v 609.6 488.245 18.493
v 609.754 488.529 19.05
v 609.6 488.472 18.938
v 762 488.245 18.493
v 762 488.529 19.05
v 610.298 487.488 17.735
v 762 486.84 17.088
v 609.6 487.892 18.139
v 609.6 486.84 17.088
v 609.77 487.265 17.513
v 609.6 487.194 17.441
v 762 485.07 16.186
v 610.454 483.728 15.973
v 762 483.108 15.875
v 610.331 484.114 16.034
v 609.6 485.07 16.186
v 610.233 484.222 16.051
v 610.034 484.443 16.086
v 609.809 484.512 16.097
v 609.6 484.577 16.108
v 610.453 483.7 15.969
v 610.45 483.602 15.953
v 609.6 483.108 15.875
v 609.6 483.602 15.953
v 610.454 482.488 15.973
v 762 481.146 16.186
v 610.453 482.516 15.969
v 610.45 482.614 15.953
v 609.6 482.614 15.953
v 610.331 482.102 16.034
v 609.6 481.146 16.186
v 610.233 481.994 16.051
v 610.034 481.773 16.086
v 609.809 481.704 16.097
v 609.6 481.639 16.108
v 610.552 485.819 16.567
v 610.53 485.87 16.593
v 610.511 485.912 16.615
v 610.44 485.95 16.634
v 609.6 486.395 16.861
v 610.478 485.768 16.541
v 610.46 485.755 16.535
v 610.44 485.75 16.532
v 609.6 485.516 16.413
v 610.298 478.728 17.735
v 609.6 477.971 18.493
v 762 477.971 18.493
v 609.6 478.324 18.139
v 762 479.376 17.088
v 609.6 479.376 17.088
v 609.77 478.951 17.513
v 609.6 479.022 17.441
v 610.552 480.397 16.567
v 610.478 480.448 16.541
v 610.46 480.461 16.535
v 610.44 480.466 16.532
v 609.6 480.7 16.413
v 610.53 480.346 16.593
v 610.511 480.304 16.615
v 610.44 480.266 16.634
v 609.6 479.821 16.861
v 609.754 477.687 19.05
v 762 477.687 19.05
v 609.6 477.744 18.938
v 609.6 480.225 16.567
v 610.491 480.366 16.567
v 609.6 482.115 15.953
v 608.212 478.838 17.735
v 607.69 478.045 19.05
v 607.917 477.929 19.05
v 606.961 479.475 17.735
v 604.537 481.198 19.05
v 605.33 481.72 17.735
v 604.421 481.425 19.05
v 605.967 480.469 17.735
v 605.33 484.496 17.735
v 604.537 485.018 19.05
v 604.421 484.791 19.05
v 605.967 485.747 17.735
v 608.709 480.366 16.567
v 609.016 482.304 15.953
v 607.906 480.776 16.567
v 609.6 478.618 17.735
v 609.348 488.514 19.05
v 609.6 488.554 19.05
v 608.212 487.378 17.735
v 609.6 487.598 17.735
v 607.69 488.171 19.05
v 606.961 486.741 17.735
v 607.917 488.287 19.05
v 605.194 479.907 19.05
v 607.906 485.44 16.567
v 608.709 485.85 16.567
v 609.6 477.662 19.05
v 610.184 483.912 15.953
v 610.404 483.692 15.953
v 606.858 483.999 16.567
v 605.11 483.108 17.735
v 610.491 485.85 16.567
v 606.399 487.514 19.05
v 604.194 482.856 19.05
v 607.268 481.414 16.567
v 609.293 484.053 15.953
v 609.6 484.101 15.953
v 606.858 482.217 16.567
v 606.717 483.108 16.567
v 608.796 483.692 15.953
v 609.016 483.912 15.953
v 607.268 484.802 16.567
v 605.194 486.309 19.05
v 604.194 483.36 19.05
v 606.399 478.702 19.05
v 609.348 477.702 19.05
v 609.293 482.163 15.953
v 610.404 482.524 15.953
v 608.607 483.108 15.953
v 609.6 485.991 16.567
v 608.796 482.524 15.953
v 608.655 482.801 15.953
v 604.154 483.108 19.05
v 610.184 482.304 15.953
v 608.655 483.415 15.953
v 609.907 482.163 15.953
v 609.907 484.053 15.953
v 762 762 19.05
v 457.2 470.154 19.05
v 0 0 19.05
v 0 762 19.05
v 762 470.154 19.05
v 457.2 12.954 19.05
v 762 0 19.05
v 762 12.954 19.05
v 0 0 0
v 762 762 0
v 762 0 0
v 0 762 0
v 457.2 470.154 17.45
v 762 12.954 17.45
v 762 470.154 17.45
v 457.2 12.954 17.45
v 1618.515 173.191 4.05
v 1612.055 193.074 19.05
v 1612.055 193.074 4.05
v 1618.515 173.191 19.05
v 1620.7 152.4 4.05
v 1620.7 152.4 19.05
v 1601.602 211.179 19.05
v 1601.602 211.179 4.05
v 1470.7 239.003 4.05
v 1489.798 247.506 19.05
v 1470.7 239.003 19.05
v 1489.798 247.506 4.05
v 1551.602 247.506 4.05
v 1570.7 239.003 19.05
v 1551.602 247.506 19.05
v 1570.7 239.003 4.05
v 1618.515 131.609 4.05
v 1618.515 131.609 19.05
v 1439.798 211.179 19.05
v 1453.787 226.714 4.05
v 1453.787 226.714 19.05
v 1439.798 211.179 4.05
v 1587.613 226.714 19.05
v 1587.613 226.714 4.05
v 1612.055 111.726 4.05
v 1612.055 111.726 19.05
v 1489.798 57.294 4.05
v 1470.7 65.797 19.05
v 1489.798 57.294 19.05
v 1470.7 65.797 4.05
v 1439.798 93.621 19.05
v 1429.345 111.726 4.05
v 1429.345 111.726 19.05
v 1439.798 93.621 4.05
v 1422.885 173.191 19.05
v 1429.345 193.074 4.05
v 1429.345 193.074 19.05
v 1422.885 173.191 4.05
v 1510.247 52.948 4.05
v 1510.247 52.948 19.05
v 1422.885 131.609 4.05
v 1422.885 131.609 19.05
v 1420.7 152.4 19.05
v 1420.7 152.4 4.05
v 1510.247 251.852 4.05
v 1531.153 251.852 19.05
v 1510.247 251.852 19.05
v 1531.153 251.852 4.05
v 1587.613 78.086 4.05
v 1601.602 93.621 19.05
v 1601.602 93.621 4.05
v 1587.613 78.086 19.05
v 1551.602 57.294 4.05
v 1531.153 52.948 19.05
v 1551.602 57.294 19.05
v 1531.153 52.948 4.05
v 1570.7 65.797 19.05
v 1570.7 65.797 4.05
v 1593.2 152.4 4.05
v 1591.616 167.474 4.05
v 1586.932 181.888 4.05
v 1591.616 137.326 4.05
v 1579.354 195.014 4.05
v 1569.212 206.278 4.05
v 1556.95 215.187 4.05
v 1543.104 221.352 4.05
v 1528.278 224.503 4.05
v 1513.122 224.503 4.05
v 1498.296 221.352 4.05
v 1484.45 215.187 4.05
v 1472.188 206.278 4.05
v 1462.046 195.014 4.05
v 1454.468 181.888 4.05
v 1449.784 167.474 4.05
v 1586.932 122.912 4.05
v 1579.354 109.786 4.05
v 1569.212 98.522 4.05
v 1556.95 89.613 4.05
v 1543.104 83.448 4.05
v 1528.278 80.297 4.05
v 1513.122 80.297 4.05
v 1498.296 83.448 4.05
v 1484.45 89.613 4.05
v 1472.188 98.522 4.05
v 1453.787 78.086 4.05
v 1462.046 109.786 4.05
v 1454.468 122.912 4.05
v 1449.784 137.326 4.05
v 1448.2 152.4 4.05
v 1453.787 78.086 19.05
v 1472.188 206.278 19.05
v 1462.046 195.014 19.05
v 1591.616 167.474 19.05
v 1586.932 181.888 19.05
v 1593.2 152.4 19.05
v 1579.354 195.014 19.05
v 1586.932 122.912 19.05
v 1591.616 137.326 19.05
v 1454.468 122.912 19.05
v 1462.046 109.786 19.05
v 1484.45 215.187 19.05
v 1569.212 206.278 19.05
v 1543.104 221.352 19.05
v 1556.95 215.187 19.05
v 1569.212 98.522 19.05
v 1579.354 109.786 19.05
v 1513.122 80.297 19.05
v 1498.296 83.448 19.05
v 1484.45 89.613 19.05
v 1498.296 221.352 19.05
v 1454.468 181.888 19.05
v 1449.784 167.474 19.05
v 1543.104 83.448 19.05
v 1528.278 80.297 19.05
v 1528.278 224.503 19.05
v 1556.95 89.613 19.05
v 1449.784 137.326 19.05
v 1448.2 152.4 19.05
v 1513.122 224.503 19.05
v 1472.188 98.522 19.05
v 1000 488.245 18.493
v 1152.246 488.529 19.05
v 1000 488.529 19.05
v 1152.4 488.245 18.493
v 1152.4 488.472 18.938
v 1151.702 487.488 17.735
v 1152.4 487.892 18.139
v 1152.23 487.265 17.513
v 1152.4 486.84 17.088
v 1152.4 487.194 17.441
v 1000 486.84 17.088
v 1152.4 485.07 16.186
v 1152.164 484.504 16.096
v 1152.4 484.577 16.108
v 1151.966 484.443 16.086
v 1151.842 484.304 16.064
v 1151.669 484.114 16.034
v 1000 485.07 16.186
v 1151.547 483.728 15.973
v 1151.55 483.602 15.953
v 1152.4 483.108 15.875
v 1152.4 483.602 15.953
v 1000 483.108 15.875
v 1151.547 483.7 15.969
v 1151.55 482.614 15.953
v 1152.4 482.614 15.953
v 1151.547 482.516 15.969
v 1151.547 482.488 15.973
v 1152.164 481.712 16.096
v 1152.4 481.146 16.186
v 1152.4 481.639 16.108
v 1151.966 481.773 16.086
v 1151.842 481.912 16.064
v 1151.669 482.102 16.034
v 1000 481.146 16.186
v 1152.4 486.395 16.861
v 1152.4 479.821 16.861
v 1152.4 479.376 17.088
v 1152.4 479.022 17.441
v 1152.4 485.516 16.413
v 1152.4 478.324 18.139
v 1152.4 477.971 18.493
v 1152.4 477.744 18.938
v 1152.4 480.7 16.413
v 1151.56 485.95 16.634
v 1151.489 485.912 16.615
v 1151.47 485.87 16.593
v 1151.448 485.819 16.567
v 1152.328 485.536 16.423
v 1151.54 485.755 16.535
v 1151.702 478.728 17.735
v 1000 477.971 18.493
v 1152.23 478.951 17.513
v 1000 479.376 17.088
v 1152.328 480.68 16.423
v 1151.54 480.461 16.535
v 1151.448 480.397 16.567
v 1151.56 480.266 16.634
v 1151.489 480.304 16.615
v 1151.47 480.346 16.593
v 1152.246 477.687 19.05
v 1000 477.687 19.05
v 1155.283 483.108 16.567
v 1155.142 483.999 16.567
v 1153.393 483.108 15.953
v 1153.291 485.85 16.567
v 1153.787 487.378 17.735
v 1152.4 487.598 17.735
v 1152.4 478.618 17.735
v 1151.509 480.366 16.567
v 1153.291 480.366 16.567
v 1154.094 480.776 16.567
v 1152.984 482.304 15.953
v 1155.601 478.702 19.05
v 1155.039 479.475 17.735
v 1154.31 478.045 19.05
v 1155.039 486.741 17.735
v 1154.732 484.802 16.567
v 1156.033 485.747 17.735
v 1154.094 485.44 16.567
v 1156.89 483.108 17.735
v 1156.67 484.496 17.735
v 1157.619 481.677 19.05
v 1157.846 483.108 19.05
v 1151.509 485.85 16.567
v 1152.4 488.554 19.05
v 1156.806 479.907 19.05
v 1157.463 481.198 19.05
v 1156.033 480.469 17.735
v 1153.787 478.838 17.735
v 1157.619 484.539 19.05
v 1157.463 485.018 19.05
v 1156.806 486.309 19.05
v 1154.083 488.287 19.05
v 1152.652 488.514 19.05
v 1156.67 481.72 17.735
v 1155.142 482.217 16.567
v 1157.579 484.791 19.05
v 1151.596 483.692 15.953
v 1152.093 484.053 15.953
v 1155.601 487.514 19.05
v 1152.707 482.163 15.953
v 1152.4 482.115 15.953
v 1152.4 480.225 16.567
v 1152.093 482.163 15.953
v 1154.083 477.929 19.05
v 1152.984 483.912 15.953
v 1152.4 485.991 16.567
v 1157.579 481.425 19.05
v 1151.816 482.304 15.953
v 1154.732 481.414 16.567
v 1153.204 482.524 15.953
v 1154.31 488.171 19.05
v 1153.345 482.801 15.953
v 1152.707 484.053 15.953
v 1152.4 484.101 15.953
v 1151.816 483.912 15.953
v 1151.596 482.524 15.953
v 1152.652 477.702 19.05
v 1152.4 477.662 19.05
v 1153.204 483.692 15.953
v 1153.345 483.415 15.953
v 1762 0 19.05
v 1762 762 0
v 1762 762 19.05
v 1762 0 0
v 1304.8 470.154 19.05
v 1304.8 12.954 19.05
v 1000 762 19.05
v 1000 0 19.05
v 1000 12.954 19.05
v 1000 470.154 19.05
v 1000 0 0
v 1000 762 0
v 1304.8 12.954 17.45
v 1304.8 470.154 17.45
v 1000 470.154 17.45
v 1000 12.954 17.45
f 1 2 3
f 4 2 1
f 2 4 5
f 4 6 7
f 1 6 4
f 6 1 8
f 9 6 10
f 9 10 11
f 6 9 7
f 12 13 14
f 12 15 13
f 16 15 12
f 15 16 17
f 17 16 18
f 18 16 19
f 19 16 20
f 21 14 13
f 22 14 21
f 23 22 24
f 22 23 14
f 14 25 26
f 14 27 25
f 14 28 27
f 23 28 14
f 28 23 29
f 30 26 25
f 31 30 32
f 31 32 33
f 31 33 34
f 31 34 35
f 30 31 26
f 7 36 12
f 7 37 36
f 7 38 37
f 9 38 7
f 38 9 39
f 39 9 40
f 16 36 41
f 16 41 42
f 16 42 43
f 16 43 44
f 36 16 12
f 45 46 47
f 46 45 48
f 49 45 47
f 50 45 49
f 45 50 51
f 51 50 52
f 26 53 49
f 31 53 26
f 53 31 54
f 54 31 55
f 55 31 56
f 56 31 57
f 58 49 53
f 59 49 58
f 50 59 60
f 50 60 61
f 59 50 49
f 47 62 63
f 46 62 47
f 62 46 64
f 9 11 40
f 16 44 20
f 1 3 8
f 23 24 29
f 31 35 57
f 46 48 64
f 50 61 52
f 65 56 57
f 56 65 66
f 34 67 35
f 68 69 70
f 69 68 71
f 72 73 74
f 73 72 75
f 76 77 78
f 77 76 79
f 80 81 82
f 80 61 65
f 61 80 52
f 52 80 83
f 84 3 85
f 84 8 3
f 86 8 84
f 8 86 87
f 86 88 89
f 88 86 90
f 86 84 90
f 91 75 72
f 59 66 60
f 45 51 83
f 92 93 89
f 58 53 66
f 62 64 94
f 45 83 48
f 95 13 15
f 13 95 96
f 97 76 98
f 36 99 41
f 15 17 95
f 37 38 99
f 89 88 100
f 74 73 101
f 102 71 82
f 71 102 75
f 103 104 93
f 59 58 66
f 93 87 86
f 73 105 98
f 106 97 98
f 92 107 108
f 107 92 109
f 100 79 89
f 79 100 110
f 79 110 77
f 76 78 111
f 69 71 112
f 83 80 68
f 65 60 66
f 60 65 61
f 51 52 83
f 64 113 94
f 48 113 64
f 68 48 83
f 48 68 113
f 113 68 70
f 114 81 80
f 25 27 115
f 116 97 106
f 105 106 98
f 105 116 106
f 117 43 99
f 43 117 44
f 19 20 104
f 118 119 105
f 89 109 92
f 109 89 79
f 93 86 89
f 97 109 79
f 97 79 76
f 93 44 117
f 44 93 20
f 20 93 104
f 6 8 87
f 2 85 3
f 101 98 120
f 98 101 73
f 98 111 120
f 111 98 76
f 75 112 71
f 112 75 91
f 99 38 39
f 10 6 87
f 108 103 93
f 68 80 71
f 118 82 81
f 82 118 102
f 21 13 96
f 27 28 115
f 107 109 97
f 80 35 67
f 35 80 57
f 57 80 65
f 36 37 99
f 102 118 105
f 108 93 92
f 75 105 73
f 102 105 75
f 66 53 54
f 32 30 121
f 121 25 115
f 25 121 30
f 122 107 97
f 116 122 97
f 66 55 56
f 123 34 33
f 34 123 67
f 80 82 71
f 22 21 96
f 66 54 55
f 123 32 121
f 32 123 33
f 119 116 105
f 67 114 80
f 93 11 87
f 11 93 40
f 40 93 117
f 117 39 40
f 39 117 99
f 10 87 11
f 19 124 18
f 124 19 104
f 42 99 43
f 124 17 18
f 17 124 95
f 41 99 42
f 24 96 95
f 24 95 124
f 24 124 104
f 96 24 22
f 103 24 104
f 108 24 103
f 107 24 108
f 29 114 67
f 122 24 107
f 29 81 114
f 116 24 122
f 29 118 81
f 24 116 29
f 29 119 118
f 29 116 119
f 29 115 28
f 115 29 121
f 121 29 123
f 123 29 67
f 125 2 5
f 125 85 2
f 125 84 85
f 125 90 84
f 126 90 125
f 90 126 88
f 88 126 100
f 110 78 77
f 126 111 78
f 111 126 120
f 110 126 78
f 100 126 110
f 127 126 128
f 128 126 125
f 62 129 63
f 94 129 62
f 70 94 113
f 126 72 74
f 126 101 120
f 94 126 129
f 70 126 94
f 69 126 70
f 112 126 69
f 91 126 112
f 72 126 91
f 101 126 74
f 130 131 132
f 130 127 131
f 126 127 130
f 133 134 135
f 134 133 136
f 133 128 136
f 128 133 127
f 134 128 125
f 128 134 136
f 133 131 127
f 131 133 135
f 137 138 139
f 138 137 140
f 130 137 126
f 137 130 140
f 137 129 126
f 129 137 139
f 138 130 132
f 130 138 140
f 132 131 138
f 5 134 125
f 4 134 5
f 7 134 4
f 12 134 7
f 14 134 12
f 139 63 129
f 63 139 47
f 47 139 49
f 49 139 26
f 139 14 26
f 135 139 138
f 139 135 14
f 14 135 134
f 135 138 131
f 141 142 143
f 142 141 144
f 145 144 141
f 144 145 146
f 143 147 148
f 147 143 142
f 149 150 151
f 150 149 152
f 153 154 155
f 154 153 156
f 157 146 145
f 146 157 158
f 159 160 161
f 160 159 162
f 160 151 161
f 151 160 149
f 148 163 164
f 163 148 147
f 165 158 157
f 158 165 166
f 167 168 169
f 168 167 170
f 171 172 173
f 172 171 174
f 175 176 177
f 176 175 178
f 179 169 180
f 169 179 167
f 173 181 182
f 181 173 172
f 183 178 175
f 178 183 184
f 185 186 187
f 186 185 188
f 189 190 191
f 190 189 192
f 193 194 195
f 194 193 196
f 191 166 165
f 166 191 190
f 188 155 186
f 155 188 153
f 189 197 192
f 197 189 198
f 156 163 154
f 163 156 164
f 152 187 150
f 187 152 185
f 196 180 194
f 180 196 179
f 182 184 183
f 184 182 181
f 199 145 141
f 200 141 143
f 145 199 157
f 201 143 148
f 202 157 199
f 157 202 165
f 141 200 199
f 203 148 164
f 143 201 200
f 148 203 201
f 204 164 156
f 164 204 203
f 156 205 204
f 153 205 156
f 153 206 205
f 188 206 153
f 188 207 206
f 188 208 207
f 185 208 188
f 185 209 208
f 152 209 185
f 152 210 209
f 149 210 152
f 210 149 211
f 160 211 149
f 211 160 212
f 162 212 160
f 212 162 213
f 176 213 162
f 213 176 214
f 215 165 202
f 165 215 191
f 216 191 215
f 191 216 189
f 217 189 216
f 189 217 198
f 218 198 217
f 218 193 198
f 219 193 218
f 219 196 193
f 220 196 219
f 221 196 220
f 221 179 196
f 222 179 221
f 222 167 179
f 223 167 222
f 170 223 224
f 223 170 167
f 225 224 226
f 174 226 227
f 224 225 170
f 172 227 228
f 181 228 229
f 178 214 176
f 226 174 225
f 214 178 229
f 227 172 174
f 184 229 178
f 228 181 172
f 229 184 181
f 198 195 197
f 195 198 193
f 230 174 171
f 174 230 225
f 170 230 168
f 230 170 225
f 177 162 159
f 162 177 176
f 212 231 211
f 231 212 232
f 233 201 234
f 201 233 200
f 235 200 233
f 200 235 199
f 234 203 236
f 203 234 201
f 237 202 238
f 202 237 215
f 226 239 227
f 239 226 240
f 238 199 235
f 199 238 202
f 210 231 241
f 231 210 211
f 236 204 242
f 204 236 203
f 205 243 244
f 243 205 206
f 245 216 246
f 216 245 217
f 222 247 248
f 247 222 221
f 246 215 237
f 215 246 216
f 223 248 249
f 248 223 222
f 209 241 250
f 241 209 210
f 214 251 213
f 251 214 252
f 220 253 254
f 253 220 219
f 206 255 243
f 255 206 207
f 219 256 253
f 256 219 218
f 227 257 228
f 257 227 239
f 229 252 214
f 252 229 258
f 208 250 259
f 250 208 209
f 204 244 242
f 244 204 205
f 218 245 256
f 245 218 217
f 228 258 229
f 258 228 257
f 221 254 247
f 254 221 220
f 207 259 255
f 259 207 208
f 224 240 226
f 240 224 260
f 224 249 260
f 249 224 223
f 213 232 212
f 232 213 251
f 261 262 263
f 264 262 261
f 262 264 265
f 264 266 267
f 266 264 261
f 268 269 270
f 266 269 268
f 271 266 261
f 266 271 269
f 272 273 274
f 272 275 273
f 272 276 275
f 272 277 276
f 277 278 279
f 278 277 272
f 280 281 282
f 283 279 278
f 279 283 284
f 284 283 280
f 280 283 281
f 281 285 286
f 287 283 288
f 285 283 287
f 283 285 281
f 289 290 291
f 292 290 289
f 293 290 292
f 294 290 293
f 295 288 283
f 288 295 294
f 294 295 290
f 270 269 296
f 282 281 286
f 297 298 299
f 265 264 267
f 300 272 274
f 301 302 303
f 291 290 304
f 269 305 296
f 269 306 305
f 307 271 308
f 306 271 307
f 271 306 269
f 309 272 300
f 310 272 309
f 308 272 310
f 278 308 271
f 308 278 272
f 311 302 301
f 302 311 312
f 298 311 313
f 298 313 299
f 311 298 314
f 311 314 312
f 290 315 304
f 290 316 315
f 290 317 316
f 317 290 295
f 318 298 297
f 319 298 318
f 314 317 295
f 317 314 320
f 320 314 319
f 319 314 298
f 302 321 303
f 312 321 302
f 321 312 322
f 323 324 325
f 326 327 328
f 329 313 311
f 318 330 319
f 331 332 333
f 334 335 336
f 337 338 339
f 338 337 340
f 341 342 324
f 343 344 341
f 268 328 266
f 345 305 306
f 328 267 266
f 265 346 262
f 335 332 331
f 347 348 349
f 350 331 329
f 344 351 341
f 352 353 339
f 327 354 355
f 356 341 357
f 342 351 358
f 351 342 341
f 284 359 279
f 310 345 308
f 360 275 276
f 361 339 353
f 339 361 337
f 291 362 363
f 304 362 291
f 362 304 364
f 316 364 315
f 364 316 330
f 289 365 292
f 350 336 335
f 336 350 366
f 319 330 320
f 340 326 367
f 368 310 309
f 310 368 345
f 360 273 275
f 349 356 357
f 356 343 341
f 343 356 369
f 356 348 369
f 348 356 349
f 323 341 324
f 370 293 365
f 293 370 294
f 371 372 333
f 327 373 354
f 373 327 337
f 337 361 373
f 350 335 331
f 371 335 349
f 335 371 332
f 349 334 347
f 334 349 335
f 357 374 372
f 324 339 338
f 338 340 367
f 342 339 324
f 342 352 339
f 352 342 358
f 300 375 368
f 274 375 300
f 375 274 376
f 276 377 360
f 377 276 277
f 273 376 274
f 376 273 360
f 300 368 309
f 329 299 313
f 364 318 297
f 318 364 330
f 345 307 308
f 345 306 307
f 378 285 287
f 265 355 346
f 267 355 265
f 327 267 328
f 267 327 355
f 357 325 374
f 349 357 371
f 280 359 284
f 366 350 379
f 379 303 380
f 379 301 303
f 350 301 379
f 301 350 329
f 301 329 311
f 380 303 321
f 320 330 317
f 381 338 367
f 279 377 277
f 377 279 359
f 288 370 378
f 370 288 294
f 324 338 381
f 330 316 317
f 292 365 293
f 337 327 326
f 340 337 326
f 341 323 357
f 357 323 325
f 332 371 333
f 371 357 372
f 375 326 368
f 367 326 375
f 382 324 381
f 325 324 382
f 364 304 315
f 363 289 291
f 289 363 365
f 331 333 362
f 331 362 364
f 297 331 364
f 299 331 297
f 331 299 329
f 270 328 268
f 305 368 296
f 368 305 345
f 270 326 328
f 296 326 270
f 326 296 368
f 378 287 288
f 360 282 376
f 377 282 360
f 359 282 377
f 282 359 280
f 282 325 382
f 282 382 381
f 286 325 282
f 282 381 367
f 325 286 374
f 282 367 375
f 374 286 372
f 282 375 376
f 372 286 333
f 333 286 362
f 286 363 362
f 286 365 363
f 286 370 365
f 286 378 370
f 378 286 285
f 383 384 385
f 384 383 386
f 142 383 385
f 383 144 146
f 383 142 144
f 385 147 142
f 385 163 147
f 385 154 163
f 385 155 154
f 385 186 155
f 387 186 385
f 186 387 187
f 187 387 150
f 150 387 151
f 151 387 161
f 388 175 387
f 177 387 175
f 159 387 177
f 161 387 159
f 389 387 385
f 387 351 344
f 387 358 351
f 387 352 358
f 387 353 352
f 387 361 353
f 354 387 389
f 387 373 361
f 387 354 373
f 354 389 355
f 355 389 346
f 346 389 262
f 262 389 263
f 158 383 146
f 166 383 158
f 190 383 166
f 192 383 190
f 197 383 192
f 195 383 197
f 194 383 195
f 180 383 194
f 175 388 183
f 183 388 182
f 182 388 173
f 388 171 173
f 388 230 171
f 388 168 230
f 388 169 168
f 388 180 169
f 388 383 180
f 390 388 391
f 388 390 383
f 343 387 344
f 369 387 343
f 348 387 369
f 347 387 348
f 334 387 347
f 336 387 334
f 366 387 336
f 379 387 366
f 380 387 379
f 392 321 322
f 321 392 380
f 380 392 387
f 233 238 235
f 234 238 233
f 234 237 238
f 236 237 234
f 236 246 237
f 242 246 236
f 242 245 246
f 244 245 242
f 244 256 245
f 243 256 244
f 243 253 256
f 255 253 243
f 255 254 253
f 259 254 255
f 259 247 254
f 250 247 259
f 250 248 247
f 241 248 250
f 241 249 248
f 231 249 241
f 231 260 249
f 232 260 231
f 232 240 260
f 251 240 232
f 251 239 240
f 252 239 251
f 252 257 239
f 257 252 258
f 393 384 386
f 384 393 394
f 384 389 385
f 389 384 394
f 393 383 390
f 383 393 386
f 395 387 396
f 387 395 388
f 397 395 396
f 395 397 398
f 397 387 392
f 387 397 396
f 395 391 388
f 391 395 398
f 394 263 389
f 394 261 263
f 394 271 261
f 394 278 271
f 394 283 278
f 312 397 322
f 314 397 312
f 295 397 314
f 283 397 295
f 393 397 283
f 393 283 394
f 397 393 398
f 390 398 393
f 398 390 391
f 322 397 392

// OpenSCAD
/*
  Top surface of the desk:

  Plane away old veneer
  
  Pocket for leather writing pad

  Circle for turntable

*/

inch = 25.4;

desk_width = 5 * 12 * inch;
desk_depth = 2.5 * 12 * inch;
desk_thickness = (3 / 4) * inch;

veneer_thickness = 1;           /* measure */

leather_width = 24 * inch;
leather_depth = 18 * inch;
leather_offset = 0.51 * inch;
leather_thickness = 1.6;        /* measure */

turntable_outer_diameter = 200;
turntable_inner_diameter = 145;
turntable_depth = 15;

turntable_from_right = 9.5 * inch;
turntable_from_front = 6 * inch;

pen_groove_length = 12 * inch;
pen_groove_width = 0.5 * inch;
pen_groove_depth = 0.125 * inch;

module pen_groove() {
     translate([-pen_groove_length/2,
                0,
                desk_thickness + (pen_groove_width/2 - pen_groove_depth)])
          union() {
               rotate([0, 90, 0]) cylinder(h=pen_groove_length, d=pen_groove_width);
               sphere(d=pen_groove_width);
               translate([pen_groove_length, 0, 0]) sphere(d=pen_groove_width);
          }
}

module desk_surface() {
    difference() {
         cube([desk_width, desk_depth, desk_thickness]);
         translate([(desk_width - leather_width) / 2,
                    leather_offset,
                    desk_thickness - leather_thickness]) {
              cube([leather_width, leather_depth, leather_thickness]);
         }
         translate([desk_width - turntable_from_right,
                    turntable_from_front,
                    desk_thickness - turntable_depth]) {
              difference() {
                   cylinder(h=turntable_depth,
                            d=turntable_outer_diameter);
                   cylinder(h=turntable_depth,
                            d=turntable_inner_diameter);
              }
         }
         translate([desk_width/2, leather_offset + leather_depth + leather_offset, 0]) pen_groove();
    }
}

module left_half() {
     intersection() {
          desk_surface();
          cube([desk_width/2, desk_depth, desk_thickness]);
     }
}

module right_half() {
     intersection() {
          translate([-desk_width/2, 0, 0]) desk_surface();
          cube([desk_width/2, desk_depth, desk_thickness]);
     }
}

left_half();
translate([1000, 0, 0]) right_half();
